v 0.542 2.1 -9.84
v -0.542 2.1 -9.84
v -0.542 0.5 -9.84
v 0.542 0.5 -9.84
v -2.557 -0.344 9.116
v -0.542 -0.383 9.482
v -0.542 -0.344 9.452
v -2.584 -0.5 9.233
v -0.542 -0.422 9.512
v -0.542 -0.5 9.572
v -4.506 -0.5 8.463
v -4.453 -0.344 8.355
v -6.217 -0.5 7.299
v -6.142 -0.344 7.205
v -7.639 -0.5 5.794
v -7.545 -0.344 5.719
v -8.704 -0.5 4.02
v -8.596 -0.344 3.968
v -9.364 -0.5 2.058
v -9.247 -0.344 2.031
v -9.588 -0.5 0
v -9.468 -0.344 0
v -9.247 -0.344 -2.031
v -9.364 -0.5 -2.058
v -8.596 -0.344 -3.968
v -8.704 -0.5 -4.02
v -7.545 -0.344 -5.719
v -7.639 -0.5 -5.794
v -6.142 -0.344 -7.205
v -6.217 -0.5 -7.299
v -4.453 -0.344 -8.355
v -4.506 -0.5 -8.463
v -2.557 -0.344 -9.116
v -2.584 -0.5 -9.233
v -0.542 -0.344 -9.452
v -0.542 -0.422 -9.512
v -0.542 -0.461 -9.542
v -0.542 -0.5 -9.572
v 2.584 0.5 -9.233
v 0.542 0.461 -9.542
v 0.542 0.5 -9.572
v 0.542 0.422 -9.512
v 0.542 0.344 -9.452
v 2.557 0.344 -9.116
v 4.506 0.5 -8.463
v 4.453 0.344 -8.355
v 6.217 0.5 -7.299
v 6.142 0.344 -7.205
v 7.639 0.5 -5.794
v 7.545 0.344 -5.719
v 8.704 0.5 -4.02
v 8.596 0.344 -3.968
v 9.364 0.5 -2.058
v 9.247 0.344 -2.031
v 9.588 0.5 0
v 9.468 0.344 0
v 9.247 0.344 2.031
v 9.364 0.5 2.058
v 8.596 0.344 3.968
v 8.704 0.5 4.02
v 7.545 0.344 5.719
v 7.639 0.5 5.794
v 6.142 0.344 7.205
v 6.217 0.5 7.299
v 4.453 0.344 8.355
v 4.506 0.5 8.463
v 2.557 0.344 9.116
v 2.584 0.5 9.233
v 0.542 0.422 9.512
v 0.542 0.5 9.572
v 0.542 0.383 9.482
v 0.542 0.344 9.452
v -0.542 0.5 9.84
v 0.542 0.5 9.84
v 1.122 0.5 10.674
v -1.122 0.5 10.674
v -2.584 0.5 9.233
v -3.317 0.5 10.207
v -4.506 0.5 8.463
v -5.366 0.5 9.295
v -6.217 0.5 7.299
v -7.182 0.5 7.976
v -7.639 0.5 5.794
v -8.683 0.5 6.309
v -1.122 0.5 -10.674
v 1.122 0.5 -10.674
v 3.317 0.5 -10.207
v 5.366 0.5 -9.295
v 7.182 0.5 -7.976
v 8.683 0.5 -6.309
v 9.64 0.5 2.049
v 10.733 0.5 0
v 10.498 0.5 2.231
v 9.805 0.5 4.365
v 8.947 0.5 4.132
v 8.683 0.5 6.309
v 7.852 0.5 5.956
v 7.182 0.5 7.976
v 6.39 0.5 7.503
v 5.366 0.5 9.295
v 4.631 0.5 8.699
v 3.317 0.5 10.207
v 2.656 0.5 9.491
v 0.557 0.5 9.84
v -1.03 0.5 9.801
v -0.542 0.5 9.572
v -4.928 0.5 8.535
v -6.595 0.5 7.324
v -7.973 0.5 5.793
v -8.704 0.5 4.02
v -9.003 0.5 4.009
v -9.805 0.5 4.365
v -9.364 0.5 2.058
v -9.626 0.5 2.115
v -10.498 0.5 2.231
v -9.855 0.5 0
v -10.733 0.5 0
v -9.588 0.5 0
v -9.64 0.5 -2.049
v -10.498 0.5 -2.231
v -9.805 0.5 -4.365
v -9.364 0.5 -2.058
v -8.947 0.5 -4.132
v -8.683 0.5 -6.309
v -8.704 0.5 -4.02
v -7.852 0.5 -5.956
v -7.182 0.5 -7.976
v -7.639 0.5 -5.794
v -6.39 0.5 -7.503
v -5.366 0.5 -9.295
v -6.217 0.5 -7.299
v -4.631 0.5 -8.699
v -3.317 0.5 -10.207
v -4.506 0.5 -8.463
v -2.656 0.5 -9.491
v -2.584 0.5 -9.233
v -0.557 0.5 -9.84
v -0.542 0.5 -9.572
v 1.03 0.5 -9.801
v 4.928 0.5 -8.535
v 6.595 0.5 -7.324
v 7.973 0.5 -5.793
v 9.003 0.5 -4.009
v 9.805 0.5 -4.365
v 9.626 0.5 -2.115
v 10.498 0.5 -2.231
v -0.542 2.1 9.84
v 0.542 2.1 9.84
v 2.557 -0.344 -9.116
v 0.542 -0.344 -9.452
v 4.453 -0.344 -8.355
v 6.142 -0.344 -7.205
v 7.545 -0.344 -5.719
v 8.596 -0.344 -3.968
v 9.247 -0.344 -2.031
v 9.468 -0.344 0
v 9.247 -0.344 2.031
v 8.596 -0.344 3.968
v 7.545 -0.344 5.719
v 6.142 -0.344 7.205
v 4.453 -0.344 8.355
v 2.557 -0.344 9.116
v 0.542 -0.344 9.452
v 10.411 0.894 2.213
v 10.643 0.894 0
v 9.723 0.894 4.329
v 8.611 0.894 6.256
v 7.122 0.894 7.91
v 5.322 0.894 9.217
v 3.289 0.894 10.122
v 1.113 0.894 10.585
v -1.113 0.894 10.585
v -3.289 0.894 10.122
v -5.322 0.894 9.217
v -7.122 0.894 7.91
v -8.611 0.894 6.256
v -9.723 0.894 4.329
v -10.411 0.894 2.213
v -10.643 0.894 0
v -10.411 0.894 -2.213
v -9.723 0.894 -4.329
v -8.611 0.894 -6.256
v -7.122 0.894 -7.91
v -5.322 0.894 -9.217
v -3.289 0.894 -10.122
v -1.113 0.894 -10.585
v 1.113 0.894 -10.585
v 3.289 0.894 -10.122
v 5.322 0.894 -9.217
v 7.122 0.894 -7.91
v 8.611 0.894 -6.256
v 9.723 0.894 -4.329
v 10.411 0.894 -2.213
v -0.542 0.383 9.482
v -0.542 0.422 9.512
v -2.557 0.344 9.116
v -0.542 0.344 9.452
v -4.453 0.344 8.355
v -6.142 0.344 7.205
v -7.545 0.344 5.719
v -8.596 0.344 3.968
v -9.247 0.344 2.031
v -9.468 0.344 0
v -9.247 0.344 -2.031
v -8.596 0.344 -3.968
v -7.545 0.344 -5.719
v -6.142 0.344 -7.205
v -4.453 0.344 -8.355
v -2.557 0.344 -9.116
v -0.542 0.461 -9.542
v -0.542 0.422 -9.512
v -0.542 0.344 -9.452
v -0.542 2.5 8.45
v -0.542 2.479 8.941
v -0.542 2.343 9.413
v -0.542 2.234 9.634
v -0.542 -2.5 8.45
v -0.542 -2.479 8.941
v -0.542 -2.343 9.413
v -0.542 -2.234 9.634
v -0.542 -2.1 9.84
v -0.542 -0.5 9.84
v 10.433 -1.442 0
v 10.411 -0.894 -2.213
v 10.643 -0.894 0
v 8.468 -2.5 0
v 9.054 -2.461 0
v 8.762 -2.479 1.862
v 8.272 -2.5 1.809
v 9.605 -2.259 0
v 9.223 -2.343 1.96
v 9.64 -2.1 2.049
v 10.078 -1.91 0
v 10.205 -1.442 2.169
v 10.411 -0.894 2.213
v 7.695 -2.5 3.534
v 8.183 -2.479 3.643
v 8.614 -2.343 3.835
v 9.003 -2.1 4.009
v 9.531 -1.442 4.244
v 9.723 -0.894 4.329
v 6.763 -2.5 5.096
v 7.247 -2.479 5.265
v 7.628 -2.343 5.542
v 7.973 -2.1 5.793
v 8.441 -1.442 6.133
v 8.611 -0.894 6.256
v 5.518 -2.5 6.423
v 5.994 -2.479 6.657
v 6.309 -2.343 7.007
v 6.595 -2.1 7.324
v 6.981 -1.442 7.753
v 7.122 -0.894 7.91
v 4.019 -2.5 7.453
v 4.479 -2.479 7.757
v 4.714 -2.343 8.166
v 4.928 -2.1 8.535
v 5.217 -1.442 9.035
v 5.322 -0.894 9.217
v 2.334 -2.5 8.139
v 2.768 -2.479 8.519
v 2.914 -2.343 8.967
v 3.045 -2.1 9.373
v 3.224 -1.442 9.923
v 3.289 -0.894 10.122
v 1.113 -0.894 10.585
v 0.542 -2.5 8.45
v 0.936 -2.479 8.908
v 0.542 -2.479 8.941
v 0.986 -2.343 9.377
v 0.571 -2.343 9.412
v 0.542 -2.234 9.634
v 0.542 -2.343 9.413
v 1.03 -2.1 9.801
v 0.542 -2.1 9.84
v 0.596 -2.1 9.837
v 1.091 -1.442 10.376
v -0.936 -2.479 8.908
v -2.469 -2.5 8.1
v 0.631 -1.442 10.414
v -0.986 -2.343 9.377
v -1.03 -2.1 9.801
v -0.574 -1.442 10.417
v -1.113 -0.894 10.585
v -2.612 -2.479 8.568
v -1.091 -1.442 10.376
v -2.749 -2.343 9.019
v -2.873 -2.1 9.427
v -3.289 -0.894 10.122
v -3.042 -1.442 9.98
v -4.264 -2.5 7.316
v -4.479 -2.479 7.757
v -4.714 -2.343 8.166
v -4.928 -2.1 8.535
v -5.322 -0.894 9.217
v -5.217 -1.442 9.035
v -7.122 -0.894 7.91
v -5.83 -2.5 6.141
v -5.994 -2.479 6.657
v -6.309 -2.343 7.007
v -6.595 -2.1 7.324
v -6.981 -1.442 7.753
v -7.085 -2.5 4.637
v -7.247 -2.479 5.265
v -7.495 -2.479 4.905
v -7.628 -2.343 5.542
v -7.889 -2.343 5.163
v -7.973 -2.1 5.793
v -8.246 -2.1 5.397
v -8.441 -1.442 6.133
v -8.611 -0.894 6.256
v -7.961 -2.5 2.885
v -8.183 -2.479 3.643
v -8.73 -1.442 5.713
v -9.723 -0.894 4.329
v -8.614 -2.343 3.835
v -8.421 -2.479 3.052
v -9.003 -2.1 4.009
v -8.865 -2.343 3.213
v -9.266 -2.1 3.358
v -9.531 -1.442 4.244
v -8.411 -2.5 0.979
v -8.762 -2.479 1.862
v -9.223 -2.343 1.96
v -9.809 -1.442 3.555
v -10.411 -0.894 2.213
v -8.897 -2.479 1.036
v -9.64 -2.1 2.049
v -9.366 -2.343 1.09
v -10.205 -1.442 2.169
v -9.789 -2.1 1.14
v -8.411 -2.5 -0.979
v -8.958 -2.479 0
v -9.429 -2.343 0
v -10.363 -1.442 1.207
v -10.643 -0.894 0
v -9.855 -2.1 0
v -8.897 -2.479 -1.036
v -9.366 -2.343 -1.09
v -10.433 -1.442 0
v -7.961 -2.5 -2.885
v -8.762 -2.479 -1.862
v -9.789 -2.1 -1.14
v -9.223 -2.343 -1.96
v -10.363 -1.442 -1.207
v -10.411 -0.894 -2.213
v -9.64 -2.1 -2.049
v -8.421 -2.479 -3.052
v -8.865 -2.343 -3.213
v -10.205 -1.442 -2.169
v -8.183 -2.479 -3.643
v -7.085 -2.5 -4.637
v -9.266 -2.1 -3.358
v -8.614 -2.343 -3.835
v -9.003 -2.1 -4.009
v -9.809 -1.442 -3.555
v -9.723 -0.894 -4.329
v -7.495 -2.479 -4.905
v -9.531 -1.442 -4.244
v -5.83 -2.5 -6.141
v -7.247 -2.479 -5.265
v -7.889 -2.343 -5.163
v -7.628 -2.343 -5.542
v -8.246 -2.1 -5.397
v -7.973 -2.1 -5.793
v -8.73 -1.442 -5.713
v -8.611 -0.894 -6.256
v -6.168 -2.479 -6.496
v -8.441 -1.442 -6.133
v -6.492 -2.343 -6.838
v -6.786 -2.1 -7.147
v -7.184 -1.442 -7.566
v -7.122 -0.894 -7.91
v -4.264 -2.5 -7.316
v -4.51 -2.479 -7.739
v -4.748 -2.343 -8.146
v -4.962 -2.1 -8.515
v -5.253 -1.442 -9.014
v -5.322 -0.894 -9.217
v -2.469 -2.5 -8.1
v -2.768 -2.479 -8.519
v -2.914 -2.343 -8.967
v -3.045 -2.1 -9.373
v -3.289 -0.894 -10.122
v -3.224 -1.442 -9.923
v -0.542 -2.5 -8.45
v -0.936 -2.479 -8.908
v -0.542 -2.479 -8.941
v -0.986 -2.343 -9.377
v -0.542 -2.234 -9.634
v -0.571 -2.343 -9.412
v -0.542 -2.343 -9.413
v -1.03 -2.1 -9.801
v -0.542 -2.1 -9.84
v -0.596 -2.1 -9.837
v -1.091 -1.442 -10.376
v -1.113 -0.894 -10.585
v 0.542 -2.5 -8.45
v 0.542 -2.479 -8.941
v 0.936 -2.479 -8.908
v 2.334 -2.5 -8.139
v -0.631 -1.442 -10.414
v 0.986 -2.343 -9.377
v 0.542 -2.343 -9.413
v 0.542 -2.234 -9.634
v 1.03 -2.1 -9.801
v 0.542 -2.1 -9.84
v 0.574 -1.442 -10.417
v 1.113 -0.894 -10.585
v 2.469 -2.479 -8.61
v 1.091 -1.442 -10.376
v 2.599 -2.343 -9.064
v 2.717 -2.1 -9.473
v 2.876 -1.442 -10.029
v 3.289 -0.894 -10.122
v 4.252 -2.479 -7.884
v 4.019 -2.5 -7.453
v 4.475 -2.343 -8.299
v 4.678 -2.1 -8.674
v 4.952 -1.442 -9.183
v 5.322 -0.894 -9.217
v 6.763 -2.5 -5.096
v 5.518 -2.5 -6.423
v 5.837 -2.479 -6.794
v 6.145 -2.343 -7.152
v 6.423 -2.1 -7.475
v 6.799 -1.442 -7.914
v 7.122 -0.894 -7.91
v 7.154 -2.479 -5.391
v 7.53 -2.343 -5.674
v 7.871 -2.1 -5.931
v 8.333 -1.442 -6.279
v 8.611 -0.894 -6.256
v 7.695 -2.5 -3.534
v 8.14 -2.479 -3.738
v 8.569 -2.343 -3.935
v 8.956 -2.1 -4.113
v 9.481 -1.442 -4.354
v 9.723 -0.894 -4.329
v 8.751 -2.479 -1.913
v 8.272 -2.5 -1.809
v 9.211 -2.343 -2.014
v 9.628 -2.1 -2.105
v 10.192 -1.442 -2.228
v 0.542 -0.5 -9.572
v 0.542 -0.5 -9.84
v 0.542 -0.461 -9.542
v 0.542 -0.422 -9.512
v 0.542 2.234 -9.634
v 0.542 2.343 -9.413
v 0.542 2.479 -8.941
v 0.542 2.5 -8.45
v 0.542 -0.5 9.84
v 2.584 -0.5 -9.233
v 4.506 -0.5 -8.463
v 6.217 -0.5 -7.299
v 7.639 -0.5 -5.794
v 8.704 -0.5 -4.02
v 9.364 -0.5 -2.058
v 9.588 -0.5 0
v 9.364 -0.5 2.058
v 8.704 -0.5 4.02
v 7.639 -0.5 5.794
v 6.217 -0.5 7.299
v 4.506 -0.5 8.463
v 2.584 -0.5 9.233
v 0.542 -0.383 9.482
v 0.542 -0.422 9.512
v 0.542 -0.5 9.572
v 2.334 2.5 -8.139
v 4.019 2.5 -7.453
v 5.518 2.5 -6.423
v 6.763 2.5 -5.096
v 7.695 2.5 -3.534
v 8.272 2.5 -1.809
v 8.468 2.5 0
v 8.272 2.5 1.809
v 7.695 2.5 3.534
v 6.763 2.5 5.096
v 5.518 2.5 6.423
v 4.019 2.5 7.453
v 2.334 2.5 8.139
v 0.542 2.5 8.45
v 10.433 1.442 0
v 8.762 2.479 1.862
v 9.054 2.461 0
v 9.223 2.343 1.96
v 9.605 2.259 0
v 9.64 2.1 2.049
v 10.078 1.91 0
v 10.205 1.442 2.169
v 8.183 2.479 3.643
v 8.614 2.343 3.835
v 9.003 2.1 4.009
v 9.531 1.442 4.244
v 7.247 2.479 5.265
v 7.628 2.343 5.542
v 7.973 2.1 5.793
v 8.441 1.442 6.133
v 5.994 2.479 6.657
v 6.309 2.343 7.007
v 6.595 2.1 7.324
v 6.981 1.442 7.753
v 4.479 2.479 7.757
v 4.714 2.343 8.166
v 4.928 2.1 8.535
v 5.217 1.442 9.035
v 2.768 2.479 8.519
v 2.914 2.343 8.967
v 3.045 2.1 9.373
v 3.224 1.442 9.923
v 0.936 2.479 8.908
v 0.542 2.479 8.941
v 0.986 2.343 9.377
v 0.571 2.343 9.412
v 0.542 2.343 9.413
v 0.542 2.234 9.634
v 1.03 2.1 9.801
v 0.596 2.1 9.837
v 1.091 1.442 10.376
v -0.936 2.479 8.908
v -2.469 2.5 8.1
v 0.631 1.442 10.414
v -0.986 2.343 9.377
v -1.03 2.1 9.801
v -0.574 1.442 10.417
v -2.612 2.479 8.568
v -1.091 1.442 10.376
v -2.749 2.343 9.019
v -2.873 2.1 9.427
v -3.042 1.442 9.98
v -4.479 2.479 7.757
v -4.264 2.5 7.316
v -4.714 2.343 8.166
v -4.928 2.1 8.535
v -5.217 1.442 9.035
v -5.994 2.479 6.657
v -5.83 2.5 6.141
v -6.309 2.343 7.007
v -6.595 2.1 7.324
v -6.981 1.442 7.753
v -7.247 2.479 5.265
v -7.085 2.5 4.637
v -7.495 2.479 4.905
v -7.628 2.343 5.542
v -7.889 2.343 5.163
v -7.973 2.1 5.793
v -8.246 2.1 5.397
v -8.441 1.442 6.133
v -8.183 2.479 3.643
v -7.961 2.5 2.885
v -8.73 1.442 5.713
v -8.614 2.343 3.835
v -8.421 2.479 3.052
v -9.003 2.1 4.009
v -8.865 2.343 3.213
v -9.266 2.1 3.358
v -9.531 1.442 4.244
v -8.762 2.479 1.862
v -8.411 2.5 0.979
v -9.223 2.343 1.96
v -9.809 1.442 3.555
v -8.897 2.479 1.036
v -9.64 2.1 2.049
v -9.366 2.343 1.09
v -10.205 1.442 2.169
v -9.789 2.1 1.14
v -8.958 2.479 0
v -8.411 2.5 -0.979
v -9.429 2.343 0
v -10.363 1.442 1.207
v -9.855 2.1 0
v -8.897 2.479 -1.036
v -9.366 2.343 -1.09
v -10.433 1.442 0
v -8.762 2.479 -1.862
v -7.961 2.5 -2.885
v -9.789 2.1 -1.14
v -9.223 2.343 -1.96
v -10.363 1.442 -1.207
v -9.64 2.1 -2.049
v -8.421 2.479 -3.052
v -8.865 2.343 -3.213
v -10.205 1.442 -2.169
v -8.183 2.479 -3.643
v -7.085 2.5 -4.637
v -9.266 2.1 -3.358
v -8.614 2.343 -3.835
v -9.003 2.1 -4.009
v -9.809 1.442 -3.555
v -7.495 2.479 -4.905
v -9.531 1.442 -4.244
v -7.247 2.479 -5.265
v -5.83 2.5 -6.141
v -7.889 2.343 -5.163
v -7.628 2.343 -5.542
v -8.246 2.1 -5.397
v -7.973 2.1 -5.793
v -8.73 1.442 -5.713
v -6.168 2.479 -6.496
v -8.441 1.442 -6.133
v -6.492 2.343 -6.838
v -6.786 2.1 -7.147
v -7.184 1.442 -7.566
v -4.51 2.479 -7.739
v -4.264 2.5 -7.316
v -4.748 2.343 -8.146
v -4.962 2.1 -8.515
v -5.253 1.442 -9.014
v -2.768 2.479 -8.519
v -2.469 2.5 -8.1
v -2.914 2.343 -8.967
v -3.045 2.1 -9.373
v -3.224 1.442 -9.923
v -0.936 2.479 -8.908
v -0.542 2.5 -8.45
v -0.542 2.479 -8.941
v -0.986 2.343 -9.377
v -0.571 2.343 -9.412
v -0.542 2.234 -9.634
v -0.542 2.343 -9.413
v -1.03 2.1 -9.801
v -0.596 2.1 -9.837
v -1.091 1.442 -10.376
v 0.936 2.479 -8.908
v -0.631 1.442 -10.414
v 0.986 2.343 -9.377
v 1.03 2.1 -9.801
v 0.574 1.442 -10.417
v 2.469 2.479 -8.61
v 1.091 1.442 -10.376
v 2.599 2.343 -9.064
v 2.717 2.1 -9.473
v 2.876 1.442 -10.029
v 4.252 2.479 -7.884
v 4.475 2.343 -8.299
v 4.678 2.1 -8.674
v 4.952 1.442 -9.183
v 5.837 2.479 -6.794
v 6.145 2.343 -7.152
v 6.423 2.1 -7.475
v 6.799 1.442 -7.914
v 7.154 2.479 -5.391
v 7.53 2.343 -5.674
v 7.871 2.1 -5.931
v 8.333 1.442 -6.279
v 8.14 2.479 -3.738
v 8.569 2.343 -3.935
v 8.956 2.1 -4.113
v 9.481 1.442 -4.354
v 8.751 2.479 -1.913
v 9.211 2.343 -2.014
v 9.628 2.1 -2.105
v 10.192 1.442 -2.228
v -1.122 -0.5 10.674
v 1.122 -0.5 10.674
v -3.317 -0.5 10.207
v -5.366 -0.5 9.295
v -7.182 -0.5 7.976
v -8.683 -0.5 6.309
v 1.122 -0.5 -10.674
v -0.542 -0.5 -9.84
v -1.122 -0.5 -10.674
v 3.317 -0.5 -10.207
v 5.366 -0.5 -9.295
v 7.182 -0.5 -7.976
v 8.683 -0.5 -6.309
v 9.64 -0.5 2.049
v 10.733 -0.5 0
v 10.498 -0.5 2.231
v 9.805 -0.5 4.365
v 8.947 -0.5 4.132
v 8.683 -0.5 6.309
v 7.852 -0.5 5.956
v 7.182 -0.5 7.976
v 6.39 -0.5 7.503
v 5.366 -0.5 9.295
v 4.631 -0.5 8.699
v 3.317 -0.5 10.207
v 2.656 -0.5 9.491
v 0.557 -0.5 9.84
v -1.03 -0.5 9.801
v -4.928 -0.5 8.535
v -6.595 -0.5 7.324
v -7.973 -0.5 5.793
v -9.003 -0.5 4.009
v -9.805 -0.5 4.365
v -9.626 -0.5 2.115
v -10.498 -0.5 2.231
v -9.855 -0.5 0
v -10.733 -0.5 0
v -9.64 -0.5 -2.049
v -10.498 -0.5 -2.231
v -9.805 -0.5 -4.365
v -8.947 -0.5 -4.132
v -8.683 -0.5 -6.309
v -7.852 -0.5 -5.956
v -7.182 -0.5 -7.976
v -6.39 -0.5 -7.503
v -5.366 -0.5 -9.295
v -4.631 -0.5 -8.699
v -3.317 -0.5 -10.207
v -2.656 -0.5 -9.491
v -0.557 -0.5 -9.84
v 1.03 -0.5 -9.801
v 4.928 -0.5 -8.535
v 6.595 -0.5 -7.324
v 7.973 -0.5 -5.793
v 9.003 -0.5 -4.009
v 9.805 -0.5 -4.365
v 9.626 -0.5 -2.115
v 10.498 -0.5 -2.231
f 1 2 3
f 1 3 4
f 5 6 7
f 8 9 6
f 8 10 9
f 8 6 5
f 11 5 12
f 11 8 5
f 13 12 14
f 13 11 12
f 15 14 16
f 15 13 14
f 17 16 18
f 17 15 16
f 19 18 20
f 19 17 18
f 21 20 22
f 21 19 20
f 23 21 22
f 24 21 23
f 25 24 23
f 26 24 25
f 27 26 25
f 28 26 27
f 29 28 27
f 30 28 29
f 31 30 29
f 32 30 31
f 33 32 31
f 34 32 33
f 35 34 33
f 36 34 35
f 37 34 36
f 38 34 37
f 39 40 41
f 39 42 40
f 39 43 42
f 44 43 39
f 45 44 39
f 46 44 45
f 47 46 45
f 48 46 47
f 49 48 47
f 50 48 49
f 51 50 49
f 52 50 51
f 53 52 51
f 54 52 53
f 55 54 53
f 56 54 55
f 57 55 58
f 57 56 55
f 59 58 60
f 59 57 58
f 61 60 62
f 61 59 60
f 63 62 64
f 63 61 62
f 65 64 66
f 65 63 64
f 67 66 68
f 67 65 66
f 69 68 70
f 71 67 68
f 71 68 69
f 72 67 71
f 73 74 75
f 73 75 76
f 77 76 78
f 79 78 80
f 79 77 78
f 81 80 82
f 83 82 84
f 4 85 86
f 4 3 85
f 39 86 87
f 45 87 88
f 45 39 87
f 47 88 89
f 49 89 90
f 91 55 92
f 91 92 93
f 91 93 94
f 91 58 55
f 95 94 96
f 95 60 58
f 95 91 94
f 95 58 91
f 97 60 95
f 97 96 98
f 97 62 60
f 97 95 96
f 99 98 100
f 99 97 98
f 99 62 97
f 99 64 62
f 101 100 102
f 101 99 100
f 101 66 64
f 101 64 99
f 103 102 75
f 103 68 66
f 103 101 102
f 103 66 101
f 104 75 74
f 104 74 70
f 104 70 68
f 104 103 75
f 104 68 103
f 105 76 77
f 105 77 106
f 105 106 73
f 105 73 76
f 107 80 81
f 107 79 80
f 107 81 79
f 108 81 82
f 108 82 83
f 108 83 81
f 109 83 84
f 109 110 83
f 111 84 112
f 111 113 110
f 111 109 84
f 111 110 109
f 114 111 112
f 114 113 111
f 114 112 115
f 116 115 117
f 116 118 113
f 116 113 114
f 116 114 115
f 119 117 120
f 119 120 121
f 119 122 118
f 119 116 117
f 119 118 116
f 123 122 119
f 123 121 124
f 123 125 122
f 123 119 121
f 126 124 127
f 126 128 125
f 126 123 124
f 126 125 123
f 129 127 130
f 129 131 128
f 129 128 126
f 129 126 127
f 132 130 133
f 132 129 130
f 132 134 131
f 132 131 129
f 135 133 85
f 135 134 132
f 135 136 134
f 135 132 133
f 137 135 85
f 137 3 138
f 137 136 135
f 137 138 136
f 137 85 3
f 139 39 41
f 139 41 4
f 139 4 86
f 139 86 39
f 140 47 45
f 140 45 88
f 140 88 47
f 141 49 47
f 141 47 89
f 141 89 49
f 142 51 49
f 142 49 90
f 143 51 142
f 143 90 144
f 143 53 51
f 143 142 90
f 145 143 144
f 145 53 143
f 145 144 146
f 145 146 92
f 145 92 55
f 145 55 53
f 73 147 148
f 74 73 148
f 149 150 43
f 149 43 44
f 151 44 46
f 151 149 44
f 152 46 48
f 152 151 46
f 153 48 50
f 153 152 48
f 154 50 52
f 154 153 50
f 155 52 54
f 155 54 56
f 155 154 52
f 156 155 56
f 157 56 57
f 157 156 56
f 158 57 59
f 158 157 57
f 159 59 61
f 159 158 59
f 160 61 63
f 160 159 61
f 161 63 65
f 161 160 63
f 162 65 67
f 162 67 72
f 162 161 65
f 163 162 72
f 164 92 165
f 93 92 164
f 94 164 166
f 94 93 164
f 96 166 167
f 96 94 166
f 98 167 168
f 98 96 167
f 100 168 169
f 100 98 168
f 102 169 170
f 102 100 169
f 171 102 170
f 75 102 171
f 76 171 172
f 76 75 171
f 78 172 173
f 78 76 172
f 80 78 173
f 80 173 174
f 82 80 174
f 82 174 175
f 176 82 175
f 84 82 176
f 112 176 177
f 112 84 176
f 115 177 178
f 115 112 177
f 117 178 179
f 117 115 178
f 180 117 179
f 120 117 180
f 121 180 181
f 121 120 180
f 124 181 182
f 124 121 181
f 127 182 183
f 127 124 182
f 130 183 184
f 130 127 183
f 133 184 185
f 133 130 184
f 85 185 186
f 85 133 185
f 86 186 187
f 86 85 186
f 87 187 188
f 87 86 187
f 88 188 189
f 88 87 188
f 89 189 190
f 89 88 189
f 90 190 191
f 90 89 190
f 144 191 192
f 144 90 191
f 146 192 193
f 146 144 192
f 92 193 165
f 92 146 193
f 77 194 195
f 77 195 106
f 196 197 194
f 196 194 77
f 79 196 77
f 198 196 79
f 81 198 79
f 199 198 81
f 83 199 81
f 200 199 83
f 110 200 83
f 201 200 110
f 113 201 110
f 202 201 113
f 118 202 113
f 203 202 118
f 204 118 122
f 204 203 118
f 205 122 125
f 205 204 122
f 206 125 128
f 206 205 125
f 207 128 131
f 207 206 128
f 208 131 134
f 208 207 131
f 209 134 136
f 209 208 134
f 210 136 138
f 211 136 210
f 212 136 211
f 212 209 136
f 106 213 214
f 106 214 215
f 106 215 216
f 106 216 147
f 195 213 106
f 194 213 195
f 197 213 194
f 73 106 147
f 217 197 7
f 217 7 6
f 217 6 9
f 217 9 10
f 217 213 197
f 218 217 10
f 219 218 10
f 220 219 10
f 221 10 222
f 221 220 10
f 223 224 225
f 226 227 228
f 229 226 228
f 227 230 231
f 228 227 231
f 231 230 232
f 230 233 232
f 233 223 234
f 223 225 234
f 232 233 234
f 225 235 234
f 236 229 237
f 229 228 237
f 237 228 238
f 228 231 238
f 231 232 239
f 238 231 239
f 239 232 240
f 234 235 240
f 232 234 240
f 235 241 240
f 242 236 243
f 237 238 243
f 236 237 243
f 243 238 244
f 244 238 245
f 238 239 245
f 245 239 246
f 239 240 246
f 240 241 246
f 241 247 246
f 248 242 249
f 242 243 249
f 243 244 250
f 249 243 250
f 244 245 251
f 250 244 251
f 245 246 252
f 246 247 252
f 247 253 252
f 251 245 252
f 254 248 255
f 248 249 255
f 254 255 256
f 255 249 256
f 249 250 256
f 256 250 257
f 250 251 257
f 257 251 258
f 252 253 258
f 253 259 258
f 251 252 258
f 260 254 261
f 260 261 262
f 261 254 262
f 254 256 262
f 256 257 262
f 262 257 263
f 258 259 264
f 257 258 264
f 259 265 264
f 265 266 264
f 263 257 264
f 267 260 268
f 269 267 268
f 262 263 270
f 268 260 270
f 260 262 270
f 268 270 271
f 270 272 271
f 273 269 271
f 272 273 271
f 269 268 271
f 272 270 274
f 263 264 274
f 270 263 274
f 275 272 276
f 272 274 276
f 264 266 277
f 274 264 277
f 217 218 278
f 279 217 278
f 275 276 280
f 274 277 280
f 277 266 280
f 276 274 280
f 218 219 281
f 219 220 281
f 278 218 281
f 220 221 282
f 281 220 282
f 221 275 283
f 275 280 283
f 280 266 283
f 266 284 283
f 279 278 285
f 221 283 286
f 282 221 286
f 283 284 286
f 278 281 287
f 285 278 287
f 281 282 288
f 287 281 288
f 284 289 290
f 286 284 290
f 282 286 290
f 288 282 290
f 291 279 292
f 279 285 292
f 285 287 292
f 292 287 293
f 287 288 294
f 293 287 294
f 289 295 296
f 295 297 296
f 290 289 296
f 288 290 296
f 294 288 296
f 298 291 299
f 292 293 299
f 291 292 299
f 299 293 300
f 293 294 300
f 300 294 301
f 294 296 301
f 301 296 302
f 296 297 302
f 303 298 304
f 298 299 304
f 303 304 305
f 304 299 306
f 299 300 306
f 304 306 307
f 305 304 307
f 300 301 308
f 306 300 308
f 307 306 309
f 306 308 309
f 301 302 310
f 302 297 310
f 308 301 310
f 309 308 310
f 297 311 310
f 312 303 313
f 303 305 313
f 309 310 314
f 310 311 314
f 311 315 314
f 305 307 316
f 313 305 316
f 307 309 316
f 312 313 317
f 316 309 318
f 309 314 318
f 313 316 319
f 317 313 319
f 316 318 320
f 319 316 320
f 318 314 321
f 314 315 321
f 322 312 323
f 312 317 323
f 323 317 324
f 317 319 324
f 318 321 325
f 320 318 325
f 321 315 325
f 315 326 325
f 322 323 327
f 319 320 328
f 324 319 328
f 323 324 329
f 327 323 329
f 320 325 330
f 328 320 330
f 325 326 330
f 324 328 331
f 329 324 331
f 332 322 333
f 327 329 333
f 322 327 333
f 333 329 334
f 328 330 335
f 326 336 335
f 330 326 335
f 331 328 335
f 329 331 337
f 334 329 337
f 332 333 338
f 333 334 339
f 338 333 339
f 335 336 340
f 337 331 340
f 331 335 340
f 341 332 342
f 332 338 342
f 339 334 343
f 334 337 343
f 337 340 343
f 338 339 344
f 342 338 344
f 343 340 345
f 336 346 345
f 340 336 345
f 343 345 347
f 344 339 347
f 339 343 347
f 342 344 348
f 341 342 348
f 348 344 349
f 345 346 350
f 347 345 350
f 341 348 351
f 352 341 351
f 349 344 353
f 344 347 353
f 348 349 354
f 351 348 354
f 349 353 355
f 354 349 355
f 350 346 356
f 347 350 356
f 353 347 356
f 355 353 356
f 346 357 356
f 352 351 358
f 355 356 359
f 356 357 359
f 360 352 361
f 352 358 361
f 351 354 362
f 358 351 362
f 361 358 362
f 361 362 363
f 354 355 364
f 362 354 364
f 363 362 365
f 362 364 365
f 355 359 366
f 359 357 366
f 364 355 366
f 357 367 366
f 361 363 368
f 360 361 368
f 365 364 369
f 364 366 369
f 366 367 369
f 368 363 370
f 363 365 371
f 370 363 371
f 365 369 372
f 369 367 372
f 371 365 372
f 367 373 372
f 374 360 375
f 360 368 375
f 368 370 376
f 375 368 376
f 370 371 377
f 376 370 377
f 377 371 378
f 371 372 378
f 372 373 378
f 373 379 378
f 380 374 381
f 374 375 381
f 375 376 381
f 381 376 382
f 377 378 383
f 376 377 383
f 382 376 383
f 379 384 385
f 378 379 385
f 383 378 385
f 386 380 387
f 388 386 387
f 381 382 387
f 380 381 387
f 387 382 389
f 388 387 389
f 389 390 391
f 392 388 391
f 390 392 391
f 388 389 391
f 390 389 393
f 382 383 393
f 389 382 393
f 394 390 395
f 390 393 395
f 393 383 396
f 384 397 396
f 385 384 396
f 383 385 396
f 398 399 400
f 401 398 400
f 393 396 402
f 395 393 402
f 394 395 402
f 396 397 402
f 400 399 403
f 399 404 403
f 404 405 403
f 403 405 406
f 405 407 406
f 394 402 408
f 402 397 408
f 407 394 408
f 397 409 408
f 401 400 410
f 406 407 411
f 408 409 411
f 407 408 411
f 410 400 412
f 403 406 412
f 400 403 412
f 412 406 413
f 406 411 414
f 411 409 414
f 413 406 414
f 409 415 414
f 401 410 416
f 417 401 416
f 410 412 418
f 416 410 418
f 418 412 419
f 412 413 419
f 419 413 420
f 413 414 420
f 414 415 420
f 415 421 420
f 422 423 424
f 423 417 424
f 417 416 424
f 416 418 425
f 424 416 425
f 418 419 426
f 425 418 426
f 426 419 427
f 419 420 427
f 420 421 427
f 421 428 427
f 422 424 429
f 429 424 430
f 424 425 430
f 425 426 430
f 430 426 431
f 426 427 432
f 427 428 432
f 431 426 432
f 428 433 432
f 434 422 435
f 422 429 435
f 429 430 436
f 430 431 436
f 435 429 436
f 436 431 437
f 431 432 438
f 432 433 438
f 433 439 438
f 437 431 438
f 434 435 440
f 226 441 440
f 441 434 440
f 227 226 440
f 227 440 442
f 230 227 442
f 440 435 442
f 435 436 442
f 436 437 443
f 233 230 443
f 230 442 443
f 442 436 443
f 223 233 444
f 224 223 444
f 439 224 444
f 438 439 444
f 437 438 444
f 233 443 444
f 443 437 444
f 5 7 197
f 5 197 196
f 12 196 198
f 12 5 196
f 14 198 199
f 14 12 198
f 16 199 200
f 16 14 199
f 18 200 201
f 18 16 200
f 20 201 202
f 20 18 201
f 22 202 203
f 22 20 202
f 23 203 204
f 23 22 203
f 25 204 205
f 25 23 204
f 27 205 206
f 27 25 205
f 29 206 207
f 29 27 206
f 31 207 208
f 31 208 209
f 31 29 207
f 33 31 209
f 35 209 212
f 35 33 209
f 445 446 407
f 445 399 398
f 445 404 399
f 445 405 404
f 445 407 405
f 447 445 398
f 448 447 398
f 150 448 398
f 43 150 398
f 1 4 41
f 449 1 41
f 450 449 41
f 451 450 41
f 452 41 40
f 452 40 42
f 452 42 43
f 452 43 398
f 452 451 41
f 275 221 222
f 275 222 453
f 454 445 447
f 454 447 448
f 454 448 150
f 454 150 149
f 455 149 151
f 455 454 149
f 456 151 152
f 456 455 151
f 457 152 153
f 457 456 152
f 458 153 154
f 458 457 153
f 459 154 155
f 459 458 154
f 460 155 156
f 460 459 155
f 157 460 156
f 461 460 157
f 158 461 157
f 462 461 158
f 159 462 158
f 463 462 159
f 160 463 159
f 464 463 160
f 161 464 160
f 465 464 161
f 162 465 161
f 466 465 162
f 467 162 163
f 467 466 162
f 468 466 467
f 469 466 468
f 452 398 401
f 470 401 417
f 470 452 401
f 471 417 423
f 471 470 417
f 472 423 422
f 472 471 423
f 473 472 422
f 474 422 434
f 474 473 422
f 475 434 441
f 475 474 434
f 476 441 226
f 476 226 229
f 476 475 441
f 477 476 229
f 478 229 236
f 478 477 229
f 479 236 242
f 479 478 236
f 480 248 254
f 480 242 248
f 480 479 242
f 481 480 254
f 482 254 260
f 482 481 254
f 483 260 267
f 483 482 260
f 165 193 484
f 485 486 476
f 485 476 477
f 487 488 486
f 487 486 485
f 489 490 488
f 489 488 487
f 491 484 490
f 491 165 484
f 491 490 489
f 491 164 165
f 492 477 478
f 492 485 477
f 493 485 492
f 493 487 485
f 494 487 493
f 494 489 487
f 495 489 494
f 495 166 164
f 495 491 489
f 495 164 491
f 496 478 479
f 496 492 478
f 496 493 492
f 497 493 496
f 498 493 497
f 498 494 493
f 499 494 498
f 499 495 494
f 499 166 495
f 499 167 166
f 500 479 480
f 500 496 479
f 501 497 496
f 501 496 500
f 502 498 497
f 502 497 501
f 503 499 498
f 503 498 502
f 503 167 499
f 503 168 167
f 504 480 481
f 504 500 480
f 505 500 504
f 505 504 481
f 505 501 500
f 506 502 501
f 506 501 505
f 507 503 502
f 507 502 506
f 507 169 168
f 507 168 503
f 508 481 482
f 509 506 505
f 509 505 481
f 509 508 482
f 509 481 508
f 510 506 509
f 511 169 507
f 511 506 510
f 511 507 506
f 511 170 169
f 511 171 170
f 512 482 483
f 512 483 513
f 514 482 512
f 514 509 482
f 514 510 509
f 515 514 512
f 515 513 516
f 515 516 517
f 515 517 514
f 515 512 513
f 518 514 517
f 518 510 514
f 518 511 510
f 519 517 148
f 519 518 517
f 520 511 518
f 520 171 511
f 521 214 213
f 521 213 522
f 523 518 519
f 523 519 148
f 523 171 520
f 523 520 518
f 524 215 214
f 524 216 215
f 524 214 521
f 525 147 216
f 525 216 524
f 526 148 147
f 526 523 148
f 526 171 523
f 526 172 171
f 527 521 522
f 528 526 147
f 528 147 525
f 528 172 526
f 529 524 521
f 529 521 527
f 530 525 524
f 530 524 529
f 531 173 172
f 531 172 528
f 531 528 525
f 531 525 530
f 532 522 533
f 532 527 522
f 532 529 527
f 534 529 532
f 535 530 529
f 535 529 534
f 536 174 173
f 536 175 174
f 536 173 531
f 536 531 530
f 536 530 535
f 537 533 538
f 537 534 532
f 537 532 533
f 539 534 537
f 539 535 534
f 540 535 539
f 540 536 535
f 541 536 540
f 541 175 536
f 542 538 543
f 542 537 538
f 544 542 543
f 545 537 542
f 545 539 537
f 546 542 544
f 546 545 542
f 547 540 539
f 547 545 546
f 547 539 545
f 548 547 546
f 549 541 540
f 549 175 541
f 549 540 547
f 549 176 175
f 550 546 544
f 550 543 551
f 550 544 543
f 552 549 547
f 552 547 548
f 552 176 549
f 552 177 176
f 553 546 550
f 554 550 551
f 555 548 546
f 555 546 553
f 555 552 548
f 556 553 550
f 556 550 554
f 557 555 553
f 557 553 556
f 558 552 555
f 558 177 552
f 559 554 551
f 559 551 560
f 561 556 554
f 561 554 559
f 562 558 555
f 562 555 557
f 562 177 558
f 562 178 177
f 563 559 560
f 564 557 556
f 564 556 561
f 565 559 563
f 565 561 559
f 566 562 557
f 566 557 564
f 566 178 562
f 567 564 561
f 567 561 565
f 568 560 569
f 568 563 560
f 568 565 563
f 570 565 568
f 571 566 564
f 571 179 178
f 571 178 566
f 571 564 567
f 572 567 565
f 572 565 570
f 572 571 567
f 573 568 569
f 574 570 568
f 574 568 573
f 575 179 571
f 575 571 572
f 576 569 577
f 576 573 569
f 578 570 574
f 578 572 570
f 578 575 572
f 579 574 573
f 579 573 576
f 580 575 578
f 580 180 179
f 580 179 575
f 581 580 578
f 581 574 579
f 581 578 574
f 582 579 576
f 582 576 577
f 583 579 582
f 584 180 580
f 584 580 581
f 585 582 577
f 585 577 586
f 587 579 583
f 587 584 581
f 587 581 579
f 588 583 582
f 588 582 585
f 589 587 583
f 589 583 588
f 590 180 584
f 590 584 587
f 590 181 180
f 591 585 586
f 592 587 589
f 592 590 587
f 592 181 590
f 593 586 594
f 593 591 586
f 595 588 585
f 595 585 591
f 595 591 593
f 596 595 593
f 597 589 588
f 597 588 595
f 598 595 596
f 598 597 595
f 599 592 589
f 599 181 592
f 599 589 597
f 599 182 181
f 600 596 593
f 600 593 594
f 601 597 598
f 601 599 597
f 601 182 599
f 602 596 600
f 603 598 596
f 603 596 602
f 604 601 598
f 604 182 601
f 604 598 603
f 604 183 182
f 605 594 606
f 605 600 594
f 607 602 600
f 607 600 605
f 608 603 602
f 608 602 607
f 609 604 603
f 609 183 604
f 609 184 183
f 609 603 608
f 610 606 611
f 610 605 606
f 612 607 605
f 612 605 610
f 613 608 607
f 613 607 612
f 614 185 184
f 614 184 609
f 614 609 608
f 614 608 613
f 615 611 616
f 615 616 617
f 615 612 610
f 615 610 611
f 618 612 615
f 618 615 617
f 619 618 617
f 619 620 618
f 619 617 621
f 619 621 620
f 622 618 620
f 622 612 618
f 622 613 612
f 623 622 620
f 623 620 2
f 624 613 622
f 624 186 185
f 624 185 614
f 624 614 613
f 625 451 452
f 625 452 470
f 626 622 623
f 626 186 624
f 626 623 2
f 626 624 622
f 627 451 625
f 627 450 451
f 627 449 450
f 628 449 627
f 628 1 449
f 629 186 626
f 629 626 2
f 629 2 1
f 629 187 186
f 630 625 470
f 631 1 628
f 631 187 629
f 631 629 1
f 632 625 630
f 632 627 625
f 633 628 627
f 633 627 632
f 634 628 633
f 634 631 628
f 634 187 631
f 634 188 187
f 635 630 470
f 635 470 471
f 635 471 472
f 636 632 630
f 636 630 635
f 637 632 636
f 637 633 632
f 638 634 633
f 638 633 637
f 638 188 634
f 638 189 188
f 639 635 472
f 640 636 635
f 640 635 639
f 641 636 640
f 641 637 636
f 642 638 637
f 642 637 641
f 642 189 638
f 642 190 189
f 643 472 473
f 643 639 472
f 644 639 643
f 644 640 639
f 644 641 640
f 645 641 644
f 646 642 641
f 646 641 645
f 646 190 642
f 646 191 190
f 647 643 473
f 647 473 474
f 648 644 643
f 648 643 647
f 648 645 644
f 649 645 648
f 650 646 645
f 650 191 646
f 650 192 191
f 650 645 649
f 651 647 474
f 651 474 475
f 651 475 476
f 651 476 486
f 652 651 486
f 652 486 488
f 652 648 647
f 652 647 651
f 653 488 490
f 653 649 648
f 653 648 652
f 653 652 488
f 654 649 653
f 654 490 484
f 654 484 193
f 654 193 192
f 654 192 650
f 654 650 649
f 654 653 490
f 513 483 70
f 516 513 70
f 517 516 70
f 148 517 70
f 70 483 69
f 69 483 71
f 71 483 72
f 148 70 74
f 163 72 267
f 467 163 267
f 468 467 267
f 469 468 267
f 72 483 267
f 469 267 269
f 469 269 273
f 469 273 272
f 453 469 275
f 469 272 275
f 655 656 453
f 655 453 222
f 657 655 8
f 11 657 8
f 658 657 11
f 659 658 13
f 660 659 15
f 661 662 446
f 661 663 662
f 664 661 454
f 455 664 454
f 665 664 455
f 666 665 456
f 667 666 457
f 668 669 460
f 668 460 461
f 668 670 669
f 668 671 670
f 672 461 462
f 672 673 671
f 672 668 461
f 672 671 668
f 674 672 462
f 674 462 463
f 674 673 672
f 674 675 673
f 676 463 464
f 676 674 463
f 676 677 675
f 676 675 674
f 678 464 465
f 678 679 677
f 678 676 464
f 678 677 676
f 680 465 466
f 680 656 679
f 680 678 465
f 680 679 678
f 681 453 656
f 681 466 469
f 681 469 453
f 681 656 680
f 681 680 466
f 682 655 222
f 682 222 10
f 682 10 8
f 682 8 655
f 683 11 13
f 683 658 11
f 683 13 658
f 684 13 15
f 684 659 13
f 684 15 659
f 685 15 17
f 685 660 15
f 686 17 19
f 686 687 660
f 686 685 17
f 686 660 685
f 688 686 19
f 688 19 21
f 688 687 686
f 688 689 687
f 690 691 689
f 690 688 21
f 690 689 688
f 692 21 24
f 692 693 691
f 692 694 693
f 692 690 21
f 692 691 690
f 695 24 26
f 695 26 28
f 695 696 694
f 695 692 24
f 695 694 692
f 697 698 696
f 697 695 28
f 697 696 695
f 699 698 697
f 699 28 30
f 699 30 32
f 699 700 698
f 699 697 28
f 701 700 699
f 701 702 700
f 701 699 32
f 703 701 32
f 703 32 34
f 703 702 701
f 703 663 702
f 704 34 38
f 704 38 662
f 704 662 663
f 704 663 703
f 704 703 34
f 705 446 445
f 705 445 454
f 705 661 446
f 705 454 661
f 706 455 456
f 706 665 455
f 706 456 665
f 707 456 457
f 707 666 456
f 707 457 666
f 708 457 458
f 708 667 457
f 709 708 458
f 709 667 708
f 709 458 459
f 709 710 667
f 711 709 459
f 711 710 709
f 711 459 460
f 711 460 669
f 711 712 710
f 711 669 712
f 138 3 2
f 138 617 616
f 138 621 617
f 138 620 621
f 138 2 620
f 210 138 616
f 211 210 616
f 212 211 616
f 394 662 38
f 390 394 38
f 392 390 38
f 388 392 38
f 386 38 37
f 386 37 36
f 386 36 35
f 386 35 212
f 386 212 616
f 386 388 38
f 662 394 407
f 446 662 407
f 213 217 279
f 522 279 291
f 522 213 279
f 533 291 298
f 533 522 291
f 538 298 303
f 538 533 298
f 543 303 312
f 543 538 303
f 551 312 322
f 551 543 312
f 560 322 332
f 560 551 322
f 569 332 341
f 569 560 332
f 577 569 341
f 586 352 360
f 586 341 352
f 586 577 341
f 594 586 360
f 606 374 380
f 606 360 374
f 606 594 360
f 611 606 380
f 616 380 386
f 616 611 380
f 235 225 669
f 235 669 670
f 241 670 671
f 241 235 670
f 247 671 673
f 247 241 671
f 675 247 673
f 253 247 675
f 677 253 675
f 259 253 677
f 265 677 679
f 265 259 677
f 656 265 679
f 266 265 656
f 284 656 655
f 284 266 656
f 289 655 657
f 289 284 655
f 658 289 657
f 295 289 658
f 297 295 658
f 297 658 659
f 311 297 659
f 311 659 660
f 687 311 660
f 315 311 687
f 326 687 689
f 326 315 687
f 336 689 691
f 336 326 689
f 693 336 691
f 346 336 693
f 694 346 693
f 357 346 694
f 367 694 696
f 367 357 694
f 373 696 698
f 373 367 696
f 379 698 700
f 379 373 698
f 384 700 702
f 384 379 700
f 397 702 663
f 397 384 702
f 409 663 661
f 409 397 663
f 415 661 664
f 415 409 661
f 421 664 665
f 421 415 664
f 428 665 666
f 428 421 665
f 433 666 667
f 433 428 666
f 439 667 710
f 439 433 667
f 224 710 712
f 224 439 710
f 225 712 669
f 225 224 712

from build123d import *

# Parameters (mm, degrees)
F4_W          = 1.0840747273
F4_H          = 19.680833444
F5_DEPTH      = 25
F5_DEPTH_BACK = 25


# Not quite as in the source:
# - a fillet or chamfer that OpenCascade refuses, or shapes differently, is made with other operations: its cross-section is extruded or revolved along the edge and cut away or added


with BuildPart() as f2:
    # F2: sweep along a path in F0
    with BuildLine(Plane.XZ) as f2_path:
        CenterArc((0, 0), 8.65, 0, 360)
    # F1 (on Right) → F2 (sweep)
    with BuildSketch(Plane.YZ):
        Polygon((-2.5, 8.4675319269), (0, 8.4675319269), (2.5, 8.4675319269), (2.6424242295, 10.246030055), (0.5, 10.7327634469), (0.5, 9.5877971399), (0.344154765, 9.4675319269), (0, 9.4675319269), (-0.344154765, 9.4675319269), (-0.5, 9.5877971399), (-0.5, 10.7327634469), (-2.6424242295, 10.246030055), align=None)
    sweep(path=f2_path.line)

    # F3: fillet of radius 2.0708896165 on 2 edges, made by hand

    # F3_s1 → F3_t2 (revolve, cut)
    with BuildSketch(Plane.XY):
        with BuildLine():
            ThreePointArc((8.4585593646, -2.4992814666), (9.85018085, -2.103755641), (10.6432988419, -0.8937908116))
            Line((10.6432988419, -0.8937908116), (10.246030055, -2.6424242295))
            Line((10.246030055, -2.6424242295), (8.4585593646, -2.4992814666))
        make_face()
    revolve(axis=Axis((0, -2.6424242295, 0), (0, -1, 0)), mode=Mode.SUBTRACT)

    # F3_s3 → F3_t4 (revolve, cut)
    with BuildSketch(Plane.XY):
        with BuildLine():
            ThreePointArc((8.4585593646, 2.4992814666), (9.85018085, 2.103755641), (10.6432988419, 0.8937908116))
            Line((10.6432988419, 0.8937908116), (10.246030055, 2.6424242295))
            Line((10.246030055, 2.6424242295), (8.4585593646, 2.4992814666))
        make_face()
    revolve(axis=Axis((0, 2.6424242295, 0), (0, -1, 0)), mode=Mode.SUBTRACT)

    # F4 (on Front) → F5 (cut, two sides)
    with BuildSketch(Plane.XZ) as f5_sk:
        Rectangle(F4_W, F4_H)
    extrude(amount=-F5_DEPTH, mode=Mode.SUBTRACT)
    extrude(f5_sk.sketch, amount=F5_DEPTH_BACK, mode=Mode.SUBTRACT)


solid = f2.part
